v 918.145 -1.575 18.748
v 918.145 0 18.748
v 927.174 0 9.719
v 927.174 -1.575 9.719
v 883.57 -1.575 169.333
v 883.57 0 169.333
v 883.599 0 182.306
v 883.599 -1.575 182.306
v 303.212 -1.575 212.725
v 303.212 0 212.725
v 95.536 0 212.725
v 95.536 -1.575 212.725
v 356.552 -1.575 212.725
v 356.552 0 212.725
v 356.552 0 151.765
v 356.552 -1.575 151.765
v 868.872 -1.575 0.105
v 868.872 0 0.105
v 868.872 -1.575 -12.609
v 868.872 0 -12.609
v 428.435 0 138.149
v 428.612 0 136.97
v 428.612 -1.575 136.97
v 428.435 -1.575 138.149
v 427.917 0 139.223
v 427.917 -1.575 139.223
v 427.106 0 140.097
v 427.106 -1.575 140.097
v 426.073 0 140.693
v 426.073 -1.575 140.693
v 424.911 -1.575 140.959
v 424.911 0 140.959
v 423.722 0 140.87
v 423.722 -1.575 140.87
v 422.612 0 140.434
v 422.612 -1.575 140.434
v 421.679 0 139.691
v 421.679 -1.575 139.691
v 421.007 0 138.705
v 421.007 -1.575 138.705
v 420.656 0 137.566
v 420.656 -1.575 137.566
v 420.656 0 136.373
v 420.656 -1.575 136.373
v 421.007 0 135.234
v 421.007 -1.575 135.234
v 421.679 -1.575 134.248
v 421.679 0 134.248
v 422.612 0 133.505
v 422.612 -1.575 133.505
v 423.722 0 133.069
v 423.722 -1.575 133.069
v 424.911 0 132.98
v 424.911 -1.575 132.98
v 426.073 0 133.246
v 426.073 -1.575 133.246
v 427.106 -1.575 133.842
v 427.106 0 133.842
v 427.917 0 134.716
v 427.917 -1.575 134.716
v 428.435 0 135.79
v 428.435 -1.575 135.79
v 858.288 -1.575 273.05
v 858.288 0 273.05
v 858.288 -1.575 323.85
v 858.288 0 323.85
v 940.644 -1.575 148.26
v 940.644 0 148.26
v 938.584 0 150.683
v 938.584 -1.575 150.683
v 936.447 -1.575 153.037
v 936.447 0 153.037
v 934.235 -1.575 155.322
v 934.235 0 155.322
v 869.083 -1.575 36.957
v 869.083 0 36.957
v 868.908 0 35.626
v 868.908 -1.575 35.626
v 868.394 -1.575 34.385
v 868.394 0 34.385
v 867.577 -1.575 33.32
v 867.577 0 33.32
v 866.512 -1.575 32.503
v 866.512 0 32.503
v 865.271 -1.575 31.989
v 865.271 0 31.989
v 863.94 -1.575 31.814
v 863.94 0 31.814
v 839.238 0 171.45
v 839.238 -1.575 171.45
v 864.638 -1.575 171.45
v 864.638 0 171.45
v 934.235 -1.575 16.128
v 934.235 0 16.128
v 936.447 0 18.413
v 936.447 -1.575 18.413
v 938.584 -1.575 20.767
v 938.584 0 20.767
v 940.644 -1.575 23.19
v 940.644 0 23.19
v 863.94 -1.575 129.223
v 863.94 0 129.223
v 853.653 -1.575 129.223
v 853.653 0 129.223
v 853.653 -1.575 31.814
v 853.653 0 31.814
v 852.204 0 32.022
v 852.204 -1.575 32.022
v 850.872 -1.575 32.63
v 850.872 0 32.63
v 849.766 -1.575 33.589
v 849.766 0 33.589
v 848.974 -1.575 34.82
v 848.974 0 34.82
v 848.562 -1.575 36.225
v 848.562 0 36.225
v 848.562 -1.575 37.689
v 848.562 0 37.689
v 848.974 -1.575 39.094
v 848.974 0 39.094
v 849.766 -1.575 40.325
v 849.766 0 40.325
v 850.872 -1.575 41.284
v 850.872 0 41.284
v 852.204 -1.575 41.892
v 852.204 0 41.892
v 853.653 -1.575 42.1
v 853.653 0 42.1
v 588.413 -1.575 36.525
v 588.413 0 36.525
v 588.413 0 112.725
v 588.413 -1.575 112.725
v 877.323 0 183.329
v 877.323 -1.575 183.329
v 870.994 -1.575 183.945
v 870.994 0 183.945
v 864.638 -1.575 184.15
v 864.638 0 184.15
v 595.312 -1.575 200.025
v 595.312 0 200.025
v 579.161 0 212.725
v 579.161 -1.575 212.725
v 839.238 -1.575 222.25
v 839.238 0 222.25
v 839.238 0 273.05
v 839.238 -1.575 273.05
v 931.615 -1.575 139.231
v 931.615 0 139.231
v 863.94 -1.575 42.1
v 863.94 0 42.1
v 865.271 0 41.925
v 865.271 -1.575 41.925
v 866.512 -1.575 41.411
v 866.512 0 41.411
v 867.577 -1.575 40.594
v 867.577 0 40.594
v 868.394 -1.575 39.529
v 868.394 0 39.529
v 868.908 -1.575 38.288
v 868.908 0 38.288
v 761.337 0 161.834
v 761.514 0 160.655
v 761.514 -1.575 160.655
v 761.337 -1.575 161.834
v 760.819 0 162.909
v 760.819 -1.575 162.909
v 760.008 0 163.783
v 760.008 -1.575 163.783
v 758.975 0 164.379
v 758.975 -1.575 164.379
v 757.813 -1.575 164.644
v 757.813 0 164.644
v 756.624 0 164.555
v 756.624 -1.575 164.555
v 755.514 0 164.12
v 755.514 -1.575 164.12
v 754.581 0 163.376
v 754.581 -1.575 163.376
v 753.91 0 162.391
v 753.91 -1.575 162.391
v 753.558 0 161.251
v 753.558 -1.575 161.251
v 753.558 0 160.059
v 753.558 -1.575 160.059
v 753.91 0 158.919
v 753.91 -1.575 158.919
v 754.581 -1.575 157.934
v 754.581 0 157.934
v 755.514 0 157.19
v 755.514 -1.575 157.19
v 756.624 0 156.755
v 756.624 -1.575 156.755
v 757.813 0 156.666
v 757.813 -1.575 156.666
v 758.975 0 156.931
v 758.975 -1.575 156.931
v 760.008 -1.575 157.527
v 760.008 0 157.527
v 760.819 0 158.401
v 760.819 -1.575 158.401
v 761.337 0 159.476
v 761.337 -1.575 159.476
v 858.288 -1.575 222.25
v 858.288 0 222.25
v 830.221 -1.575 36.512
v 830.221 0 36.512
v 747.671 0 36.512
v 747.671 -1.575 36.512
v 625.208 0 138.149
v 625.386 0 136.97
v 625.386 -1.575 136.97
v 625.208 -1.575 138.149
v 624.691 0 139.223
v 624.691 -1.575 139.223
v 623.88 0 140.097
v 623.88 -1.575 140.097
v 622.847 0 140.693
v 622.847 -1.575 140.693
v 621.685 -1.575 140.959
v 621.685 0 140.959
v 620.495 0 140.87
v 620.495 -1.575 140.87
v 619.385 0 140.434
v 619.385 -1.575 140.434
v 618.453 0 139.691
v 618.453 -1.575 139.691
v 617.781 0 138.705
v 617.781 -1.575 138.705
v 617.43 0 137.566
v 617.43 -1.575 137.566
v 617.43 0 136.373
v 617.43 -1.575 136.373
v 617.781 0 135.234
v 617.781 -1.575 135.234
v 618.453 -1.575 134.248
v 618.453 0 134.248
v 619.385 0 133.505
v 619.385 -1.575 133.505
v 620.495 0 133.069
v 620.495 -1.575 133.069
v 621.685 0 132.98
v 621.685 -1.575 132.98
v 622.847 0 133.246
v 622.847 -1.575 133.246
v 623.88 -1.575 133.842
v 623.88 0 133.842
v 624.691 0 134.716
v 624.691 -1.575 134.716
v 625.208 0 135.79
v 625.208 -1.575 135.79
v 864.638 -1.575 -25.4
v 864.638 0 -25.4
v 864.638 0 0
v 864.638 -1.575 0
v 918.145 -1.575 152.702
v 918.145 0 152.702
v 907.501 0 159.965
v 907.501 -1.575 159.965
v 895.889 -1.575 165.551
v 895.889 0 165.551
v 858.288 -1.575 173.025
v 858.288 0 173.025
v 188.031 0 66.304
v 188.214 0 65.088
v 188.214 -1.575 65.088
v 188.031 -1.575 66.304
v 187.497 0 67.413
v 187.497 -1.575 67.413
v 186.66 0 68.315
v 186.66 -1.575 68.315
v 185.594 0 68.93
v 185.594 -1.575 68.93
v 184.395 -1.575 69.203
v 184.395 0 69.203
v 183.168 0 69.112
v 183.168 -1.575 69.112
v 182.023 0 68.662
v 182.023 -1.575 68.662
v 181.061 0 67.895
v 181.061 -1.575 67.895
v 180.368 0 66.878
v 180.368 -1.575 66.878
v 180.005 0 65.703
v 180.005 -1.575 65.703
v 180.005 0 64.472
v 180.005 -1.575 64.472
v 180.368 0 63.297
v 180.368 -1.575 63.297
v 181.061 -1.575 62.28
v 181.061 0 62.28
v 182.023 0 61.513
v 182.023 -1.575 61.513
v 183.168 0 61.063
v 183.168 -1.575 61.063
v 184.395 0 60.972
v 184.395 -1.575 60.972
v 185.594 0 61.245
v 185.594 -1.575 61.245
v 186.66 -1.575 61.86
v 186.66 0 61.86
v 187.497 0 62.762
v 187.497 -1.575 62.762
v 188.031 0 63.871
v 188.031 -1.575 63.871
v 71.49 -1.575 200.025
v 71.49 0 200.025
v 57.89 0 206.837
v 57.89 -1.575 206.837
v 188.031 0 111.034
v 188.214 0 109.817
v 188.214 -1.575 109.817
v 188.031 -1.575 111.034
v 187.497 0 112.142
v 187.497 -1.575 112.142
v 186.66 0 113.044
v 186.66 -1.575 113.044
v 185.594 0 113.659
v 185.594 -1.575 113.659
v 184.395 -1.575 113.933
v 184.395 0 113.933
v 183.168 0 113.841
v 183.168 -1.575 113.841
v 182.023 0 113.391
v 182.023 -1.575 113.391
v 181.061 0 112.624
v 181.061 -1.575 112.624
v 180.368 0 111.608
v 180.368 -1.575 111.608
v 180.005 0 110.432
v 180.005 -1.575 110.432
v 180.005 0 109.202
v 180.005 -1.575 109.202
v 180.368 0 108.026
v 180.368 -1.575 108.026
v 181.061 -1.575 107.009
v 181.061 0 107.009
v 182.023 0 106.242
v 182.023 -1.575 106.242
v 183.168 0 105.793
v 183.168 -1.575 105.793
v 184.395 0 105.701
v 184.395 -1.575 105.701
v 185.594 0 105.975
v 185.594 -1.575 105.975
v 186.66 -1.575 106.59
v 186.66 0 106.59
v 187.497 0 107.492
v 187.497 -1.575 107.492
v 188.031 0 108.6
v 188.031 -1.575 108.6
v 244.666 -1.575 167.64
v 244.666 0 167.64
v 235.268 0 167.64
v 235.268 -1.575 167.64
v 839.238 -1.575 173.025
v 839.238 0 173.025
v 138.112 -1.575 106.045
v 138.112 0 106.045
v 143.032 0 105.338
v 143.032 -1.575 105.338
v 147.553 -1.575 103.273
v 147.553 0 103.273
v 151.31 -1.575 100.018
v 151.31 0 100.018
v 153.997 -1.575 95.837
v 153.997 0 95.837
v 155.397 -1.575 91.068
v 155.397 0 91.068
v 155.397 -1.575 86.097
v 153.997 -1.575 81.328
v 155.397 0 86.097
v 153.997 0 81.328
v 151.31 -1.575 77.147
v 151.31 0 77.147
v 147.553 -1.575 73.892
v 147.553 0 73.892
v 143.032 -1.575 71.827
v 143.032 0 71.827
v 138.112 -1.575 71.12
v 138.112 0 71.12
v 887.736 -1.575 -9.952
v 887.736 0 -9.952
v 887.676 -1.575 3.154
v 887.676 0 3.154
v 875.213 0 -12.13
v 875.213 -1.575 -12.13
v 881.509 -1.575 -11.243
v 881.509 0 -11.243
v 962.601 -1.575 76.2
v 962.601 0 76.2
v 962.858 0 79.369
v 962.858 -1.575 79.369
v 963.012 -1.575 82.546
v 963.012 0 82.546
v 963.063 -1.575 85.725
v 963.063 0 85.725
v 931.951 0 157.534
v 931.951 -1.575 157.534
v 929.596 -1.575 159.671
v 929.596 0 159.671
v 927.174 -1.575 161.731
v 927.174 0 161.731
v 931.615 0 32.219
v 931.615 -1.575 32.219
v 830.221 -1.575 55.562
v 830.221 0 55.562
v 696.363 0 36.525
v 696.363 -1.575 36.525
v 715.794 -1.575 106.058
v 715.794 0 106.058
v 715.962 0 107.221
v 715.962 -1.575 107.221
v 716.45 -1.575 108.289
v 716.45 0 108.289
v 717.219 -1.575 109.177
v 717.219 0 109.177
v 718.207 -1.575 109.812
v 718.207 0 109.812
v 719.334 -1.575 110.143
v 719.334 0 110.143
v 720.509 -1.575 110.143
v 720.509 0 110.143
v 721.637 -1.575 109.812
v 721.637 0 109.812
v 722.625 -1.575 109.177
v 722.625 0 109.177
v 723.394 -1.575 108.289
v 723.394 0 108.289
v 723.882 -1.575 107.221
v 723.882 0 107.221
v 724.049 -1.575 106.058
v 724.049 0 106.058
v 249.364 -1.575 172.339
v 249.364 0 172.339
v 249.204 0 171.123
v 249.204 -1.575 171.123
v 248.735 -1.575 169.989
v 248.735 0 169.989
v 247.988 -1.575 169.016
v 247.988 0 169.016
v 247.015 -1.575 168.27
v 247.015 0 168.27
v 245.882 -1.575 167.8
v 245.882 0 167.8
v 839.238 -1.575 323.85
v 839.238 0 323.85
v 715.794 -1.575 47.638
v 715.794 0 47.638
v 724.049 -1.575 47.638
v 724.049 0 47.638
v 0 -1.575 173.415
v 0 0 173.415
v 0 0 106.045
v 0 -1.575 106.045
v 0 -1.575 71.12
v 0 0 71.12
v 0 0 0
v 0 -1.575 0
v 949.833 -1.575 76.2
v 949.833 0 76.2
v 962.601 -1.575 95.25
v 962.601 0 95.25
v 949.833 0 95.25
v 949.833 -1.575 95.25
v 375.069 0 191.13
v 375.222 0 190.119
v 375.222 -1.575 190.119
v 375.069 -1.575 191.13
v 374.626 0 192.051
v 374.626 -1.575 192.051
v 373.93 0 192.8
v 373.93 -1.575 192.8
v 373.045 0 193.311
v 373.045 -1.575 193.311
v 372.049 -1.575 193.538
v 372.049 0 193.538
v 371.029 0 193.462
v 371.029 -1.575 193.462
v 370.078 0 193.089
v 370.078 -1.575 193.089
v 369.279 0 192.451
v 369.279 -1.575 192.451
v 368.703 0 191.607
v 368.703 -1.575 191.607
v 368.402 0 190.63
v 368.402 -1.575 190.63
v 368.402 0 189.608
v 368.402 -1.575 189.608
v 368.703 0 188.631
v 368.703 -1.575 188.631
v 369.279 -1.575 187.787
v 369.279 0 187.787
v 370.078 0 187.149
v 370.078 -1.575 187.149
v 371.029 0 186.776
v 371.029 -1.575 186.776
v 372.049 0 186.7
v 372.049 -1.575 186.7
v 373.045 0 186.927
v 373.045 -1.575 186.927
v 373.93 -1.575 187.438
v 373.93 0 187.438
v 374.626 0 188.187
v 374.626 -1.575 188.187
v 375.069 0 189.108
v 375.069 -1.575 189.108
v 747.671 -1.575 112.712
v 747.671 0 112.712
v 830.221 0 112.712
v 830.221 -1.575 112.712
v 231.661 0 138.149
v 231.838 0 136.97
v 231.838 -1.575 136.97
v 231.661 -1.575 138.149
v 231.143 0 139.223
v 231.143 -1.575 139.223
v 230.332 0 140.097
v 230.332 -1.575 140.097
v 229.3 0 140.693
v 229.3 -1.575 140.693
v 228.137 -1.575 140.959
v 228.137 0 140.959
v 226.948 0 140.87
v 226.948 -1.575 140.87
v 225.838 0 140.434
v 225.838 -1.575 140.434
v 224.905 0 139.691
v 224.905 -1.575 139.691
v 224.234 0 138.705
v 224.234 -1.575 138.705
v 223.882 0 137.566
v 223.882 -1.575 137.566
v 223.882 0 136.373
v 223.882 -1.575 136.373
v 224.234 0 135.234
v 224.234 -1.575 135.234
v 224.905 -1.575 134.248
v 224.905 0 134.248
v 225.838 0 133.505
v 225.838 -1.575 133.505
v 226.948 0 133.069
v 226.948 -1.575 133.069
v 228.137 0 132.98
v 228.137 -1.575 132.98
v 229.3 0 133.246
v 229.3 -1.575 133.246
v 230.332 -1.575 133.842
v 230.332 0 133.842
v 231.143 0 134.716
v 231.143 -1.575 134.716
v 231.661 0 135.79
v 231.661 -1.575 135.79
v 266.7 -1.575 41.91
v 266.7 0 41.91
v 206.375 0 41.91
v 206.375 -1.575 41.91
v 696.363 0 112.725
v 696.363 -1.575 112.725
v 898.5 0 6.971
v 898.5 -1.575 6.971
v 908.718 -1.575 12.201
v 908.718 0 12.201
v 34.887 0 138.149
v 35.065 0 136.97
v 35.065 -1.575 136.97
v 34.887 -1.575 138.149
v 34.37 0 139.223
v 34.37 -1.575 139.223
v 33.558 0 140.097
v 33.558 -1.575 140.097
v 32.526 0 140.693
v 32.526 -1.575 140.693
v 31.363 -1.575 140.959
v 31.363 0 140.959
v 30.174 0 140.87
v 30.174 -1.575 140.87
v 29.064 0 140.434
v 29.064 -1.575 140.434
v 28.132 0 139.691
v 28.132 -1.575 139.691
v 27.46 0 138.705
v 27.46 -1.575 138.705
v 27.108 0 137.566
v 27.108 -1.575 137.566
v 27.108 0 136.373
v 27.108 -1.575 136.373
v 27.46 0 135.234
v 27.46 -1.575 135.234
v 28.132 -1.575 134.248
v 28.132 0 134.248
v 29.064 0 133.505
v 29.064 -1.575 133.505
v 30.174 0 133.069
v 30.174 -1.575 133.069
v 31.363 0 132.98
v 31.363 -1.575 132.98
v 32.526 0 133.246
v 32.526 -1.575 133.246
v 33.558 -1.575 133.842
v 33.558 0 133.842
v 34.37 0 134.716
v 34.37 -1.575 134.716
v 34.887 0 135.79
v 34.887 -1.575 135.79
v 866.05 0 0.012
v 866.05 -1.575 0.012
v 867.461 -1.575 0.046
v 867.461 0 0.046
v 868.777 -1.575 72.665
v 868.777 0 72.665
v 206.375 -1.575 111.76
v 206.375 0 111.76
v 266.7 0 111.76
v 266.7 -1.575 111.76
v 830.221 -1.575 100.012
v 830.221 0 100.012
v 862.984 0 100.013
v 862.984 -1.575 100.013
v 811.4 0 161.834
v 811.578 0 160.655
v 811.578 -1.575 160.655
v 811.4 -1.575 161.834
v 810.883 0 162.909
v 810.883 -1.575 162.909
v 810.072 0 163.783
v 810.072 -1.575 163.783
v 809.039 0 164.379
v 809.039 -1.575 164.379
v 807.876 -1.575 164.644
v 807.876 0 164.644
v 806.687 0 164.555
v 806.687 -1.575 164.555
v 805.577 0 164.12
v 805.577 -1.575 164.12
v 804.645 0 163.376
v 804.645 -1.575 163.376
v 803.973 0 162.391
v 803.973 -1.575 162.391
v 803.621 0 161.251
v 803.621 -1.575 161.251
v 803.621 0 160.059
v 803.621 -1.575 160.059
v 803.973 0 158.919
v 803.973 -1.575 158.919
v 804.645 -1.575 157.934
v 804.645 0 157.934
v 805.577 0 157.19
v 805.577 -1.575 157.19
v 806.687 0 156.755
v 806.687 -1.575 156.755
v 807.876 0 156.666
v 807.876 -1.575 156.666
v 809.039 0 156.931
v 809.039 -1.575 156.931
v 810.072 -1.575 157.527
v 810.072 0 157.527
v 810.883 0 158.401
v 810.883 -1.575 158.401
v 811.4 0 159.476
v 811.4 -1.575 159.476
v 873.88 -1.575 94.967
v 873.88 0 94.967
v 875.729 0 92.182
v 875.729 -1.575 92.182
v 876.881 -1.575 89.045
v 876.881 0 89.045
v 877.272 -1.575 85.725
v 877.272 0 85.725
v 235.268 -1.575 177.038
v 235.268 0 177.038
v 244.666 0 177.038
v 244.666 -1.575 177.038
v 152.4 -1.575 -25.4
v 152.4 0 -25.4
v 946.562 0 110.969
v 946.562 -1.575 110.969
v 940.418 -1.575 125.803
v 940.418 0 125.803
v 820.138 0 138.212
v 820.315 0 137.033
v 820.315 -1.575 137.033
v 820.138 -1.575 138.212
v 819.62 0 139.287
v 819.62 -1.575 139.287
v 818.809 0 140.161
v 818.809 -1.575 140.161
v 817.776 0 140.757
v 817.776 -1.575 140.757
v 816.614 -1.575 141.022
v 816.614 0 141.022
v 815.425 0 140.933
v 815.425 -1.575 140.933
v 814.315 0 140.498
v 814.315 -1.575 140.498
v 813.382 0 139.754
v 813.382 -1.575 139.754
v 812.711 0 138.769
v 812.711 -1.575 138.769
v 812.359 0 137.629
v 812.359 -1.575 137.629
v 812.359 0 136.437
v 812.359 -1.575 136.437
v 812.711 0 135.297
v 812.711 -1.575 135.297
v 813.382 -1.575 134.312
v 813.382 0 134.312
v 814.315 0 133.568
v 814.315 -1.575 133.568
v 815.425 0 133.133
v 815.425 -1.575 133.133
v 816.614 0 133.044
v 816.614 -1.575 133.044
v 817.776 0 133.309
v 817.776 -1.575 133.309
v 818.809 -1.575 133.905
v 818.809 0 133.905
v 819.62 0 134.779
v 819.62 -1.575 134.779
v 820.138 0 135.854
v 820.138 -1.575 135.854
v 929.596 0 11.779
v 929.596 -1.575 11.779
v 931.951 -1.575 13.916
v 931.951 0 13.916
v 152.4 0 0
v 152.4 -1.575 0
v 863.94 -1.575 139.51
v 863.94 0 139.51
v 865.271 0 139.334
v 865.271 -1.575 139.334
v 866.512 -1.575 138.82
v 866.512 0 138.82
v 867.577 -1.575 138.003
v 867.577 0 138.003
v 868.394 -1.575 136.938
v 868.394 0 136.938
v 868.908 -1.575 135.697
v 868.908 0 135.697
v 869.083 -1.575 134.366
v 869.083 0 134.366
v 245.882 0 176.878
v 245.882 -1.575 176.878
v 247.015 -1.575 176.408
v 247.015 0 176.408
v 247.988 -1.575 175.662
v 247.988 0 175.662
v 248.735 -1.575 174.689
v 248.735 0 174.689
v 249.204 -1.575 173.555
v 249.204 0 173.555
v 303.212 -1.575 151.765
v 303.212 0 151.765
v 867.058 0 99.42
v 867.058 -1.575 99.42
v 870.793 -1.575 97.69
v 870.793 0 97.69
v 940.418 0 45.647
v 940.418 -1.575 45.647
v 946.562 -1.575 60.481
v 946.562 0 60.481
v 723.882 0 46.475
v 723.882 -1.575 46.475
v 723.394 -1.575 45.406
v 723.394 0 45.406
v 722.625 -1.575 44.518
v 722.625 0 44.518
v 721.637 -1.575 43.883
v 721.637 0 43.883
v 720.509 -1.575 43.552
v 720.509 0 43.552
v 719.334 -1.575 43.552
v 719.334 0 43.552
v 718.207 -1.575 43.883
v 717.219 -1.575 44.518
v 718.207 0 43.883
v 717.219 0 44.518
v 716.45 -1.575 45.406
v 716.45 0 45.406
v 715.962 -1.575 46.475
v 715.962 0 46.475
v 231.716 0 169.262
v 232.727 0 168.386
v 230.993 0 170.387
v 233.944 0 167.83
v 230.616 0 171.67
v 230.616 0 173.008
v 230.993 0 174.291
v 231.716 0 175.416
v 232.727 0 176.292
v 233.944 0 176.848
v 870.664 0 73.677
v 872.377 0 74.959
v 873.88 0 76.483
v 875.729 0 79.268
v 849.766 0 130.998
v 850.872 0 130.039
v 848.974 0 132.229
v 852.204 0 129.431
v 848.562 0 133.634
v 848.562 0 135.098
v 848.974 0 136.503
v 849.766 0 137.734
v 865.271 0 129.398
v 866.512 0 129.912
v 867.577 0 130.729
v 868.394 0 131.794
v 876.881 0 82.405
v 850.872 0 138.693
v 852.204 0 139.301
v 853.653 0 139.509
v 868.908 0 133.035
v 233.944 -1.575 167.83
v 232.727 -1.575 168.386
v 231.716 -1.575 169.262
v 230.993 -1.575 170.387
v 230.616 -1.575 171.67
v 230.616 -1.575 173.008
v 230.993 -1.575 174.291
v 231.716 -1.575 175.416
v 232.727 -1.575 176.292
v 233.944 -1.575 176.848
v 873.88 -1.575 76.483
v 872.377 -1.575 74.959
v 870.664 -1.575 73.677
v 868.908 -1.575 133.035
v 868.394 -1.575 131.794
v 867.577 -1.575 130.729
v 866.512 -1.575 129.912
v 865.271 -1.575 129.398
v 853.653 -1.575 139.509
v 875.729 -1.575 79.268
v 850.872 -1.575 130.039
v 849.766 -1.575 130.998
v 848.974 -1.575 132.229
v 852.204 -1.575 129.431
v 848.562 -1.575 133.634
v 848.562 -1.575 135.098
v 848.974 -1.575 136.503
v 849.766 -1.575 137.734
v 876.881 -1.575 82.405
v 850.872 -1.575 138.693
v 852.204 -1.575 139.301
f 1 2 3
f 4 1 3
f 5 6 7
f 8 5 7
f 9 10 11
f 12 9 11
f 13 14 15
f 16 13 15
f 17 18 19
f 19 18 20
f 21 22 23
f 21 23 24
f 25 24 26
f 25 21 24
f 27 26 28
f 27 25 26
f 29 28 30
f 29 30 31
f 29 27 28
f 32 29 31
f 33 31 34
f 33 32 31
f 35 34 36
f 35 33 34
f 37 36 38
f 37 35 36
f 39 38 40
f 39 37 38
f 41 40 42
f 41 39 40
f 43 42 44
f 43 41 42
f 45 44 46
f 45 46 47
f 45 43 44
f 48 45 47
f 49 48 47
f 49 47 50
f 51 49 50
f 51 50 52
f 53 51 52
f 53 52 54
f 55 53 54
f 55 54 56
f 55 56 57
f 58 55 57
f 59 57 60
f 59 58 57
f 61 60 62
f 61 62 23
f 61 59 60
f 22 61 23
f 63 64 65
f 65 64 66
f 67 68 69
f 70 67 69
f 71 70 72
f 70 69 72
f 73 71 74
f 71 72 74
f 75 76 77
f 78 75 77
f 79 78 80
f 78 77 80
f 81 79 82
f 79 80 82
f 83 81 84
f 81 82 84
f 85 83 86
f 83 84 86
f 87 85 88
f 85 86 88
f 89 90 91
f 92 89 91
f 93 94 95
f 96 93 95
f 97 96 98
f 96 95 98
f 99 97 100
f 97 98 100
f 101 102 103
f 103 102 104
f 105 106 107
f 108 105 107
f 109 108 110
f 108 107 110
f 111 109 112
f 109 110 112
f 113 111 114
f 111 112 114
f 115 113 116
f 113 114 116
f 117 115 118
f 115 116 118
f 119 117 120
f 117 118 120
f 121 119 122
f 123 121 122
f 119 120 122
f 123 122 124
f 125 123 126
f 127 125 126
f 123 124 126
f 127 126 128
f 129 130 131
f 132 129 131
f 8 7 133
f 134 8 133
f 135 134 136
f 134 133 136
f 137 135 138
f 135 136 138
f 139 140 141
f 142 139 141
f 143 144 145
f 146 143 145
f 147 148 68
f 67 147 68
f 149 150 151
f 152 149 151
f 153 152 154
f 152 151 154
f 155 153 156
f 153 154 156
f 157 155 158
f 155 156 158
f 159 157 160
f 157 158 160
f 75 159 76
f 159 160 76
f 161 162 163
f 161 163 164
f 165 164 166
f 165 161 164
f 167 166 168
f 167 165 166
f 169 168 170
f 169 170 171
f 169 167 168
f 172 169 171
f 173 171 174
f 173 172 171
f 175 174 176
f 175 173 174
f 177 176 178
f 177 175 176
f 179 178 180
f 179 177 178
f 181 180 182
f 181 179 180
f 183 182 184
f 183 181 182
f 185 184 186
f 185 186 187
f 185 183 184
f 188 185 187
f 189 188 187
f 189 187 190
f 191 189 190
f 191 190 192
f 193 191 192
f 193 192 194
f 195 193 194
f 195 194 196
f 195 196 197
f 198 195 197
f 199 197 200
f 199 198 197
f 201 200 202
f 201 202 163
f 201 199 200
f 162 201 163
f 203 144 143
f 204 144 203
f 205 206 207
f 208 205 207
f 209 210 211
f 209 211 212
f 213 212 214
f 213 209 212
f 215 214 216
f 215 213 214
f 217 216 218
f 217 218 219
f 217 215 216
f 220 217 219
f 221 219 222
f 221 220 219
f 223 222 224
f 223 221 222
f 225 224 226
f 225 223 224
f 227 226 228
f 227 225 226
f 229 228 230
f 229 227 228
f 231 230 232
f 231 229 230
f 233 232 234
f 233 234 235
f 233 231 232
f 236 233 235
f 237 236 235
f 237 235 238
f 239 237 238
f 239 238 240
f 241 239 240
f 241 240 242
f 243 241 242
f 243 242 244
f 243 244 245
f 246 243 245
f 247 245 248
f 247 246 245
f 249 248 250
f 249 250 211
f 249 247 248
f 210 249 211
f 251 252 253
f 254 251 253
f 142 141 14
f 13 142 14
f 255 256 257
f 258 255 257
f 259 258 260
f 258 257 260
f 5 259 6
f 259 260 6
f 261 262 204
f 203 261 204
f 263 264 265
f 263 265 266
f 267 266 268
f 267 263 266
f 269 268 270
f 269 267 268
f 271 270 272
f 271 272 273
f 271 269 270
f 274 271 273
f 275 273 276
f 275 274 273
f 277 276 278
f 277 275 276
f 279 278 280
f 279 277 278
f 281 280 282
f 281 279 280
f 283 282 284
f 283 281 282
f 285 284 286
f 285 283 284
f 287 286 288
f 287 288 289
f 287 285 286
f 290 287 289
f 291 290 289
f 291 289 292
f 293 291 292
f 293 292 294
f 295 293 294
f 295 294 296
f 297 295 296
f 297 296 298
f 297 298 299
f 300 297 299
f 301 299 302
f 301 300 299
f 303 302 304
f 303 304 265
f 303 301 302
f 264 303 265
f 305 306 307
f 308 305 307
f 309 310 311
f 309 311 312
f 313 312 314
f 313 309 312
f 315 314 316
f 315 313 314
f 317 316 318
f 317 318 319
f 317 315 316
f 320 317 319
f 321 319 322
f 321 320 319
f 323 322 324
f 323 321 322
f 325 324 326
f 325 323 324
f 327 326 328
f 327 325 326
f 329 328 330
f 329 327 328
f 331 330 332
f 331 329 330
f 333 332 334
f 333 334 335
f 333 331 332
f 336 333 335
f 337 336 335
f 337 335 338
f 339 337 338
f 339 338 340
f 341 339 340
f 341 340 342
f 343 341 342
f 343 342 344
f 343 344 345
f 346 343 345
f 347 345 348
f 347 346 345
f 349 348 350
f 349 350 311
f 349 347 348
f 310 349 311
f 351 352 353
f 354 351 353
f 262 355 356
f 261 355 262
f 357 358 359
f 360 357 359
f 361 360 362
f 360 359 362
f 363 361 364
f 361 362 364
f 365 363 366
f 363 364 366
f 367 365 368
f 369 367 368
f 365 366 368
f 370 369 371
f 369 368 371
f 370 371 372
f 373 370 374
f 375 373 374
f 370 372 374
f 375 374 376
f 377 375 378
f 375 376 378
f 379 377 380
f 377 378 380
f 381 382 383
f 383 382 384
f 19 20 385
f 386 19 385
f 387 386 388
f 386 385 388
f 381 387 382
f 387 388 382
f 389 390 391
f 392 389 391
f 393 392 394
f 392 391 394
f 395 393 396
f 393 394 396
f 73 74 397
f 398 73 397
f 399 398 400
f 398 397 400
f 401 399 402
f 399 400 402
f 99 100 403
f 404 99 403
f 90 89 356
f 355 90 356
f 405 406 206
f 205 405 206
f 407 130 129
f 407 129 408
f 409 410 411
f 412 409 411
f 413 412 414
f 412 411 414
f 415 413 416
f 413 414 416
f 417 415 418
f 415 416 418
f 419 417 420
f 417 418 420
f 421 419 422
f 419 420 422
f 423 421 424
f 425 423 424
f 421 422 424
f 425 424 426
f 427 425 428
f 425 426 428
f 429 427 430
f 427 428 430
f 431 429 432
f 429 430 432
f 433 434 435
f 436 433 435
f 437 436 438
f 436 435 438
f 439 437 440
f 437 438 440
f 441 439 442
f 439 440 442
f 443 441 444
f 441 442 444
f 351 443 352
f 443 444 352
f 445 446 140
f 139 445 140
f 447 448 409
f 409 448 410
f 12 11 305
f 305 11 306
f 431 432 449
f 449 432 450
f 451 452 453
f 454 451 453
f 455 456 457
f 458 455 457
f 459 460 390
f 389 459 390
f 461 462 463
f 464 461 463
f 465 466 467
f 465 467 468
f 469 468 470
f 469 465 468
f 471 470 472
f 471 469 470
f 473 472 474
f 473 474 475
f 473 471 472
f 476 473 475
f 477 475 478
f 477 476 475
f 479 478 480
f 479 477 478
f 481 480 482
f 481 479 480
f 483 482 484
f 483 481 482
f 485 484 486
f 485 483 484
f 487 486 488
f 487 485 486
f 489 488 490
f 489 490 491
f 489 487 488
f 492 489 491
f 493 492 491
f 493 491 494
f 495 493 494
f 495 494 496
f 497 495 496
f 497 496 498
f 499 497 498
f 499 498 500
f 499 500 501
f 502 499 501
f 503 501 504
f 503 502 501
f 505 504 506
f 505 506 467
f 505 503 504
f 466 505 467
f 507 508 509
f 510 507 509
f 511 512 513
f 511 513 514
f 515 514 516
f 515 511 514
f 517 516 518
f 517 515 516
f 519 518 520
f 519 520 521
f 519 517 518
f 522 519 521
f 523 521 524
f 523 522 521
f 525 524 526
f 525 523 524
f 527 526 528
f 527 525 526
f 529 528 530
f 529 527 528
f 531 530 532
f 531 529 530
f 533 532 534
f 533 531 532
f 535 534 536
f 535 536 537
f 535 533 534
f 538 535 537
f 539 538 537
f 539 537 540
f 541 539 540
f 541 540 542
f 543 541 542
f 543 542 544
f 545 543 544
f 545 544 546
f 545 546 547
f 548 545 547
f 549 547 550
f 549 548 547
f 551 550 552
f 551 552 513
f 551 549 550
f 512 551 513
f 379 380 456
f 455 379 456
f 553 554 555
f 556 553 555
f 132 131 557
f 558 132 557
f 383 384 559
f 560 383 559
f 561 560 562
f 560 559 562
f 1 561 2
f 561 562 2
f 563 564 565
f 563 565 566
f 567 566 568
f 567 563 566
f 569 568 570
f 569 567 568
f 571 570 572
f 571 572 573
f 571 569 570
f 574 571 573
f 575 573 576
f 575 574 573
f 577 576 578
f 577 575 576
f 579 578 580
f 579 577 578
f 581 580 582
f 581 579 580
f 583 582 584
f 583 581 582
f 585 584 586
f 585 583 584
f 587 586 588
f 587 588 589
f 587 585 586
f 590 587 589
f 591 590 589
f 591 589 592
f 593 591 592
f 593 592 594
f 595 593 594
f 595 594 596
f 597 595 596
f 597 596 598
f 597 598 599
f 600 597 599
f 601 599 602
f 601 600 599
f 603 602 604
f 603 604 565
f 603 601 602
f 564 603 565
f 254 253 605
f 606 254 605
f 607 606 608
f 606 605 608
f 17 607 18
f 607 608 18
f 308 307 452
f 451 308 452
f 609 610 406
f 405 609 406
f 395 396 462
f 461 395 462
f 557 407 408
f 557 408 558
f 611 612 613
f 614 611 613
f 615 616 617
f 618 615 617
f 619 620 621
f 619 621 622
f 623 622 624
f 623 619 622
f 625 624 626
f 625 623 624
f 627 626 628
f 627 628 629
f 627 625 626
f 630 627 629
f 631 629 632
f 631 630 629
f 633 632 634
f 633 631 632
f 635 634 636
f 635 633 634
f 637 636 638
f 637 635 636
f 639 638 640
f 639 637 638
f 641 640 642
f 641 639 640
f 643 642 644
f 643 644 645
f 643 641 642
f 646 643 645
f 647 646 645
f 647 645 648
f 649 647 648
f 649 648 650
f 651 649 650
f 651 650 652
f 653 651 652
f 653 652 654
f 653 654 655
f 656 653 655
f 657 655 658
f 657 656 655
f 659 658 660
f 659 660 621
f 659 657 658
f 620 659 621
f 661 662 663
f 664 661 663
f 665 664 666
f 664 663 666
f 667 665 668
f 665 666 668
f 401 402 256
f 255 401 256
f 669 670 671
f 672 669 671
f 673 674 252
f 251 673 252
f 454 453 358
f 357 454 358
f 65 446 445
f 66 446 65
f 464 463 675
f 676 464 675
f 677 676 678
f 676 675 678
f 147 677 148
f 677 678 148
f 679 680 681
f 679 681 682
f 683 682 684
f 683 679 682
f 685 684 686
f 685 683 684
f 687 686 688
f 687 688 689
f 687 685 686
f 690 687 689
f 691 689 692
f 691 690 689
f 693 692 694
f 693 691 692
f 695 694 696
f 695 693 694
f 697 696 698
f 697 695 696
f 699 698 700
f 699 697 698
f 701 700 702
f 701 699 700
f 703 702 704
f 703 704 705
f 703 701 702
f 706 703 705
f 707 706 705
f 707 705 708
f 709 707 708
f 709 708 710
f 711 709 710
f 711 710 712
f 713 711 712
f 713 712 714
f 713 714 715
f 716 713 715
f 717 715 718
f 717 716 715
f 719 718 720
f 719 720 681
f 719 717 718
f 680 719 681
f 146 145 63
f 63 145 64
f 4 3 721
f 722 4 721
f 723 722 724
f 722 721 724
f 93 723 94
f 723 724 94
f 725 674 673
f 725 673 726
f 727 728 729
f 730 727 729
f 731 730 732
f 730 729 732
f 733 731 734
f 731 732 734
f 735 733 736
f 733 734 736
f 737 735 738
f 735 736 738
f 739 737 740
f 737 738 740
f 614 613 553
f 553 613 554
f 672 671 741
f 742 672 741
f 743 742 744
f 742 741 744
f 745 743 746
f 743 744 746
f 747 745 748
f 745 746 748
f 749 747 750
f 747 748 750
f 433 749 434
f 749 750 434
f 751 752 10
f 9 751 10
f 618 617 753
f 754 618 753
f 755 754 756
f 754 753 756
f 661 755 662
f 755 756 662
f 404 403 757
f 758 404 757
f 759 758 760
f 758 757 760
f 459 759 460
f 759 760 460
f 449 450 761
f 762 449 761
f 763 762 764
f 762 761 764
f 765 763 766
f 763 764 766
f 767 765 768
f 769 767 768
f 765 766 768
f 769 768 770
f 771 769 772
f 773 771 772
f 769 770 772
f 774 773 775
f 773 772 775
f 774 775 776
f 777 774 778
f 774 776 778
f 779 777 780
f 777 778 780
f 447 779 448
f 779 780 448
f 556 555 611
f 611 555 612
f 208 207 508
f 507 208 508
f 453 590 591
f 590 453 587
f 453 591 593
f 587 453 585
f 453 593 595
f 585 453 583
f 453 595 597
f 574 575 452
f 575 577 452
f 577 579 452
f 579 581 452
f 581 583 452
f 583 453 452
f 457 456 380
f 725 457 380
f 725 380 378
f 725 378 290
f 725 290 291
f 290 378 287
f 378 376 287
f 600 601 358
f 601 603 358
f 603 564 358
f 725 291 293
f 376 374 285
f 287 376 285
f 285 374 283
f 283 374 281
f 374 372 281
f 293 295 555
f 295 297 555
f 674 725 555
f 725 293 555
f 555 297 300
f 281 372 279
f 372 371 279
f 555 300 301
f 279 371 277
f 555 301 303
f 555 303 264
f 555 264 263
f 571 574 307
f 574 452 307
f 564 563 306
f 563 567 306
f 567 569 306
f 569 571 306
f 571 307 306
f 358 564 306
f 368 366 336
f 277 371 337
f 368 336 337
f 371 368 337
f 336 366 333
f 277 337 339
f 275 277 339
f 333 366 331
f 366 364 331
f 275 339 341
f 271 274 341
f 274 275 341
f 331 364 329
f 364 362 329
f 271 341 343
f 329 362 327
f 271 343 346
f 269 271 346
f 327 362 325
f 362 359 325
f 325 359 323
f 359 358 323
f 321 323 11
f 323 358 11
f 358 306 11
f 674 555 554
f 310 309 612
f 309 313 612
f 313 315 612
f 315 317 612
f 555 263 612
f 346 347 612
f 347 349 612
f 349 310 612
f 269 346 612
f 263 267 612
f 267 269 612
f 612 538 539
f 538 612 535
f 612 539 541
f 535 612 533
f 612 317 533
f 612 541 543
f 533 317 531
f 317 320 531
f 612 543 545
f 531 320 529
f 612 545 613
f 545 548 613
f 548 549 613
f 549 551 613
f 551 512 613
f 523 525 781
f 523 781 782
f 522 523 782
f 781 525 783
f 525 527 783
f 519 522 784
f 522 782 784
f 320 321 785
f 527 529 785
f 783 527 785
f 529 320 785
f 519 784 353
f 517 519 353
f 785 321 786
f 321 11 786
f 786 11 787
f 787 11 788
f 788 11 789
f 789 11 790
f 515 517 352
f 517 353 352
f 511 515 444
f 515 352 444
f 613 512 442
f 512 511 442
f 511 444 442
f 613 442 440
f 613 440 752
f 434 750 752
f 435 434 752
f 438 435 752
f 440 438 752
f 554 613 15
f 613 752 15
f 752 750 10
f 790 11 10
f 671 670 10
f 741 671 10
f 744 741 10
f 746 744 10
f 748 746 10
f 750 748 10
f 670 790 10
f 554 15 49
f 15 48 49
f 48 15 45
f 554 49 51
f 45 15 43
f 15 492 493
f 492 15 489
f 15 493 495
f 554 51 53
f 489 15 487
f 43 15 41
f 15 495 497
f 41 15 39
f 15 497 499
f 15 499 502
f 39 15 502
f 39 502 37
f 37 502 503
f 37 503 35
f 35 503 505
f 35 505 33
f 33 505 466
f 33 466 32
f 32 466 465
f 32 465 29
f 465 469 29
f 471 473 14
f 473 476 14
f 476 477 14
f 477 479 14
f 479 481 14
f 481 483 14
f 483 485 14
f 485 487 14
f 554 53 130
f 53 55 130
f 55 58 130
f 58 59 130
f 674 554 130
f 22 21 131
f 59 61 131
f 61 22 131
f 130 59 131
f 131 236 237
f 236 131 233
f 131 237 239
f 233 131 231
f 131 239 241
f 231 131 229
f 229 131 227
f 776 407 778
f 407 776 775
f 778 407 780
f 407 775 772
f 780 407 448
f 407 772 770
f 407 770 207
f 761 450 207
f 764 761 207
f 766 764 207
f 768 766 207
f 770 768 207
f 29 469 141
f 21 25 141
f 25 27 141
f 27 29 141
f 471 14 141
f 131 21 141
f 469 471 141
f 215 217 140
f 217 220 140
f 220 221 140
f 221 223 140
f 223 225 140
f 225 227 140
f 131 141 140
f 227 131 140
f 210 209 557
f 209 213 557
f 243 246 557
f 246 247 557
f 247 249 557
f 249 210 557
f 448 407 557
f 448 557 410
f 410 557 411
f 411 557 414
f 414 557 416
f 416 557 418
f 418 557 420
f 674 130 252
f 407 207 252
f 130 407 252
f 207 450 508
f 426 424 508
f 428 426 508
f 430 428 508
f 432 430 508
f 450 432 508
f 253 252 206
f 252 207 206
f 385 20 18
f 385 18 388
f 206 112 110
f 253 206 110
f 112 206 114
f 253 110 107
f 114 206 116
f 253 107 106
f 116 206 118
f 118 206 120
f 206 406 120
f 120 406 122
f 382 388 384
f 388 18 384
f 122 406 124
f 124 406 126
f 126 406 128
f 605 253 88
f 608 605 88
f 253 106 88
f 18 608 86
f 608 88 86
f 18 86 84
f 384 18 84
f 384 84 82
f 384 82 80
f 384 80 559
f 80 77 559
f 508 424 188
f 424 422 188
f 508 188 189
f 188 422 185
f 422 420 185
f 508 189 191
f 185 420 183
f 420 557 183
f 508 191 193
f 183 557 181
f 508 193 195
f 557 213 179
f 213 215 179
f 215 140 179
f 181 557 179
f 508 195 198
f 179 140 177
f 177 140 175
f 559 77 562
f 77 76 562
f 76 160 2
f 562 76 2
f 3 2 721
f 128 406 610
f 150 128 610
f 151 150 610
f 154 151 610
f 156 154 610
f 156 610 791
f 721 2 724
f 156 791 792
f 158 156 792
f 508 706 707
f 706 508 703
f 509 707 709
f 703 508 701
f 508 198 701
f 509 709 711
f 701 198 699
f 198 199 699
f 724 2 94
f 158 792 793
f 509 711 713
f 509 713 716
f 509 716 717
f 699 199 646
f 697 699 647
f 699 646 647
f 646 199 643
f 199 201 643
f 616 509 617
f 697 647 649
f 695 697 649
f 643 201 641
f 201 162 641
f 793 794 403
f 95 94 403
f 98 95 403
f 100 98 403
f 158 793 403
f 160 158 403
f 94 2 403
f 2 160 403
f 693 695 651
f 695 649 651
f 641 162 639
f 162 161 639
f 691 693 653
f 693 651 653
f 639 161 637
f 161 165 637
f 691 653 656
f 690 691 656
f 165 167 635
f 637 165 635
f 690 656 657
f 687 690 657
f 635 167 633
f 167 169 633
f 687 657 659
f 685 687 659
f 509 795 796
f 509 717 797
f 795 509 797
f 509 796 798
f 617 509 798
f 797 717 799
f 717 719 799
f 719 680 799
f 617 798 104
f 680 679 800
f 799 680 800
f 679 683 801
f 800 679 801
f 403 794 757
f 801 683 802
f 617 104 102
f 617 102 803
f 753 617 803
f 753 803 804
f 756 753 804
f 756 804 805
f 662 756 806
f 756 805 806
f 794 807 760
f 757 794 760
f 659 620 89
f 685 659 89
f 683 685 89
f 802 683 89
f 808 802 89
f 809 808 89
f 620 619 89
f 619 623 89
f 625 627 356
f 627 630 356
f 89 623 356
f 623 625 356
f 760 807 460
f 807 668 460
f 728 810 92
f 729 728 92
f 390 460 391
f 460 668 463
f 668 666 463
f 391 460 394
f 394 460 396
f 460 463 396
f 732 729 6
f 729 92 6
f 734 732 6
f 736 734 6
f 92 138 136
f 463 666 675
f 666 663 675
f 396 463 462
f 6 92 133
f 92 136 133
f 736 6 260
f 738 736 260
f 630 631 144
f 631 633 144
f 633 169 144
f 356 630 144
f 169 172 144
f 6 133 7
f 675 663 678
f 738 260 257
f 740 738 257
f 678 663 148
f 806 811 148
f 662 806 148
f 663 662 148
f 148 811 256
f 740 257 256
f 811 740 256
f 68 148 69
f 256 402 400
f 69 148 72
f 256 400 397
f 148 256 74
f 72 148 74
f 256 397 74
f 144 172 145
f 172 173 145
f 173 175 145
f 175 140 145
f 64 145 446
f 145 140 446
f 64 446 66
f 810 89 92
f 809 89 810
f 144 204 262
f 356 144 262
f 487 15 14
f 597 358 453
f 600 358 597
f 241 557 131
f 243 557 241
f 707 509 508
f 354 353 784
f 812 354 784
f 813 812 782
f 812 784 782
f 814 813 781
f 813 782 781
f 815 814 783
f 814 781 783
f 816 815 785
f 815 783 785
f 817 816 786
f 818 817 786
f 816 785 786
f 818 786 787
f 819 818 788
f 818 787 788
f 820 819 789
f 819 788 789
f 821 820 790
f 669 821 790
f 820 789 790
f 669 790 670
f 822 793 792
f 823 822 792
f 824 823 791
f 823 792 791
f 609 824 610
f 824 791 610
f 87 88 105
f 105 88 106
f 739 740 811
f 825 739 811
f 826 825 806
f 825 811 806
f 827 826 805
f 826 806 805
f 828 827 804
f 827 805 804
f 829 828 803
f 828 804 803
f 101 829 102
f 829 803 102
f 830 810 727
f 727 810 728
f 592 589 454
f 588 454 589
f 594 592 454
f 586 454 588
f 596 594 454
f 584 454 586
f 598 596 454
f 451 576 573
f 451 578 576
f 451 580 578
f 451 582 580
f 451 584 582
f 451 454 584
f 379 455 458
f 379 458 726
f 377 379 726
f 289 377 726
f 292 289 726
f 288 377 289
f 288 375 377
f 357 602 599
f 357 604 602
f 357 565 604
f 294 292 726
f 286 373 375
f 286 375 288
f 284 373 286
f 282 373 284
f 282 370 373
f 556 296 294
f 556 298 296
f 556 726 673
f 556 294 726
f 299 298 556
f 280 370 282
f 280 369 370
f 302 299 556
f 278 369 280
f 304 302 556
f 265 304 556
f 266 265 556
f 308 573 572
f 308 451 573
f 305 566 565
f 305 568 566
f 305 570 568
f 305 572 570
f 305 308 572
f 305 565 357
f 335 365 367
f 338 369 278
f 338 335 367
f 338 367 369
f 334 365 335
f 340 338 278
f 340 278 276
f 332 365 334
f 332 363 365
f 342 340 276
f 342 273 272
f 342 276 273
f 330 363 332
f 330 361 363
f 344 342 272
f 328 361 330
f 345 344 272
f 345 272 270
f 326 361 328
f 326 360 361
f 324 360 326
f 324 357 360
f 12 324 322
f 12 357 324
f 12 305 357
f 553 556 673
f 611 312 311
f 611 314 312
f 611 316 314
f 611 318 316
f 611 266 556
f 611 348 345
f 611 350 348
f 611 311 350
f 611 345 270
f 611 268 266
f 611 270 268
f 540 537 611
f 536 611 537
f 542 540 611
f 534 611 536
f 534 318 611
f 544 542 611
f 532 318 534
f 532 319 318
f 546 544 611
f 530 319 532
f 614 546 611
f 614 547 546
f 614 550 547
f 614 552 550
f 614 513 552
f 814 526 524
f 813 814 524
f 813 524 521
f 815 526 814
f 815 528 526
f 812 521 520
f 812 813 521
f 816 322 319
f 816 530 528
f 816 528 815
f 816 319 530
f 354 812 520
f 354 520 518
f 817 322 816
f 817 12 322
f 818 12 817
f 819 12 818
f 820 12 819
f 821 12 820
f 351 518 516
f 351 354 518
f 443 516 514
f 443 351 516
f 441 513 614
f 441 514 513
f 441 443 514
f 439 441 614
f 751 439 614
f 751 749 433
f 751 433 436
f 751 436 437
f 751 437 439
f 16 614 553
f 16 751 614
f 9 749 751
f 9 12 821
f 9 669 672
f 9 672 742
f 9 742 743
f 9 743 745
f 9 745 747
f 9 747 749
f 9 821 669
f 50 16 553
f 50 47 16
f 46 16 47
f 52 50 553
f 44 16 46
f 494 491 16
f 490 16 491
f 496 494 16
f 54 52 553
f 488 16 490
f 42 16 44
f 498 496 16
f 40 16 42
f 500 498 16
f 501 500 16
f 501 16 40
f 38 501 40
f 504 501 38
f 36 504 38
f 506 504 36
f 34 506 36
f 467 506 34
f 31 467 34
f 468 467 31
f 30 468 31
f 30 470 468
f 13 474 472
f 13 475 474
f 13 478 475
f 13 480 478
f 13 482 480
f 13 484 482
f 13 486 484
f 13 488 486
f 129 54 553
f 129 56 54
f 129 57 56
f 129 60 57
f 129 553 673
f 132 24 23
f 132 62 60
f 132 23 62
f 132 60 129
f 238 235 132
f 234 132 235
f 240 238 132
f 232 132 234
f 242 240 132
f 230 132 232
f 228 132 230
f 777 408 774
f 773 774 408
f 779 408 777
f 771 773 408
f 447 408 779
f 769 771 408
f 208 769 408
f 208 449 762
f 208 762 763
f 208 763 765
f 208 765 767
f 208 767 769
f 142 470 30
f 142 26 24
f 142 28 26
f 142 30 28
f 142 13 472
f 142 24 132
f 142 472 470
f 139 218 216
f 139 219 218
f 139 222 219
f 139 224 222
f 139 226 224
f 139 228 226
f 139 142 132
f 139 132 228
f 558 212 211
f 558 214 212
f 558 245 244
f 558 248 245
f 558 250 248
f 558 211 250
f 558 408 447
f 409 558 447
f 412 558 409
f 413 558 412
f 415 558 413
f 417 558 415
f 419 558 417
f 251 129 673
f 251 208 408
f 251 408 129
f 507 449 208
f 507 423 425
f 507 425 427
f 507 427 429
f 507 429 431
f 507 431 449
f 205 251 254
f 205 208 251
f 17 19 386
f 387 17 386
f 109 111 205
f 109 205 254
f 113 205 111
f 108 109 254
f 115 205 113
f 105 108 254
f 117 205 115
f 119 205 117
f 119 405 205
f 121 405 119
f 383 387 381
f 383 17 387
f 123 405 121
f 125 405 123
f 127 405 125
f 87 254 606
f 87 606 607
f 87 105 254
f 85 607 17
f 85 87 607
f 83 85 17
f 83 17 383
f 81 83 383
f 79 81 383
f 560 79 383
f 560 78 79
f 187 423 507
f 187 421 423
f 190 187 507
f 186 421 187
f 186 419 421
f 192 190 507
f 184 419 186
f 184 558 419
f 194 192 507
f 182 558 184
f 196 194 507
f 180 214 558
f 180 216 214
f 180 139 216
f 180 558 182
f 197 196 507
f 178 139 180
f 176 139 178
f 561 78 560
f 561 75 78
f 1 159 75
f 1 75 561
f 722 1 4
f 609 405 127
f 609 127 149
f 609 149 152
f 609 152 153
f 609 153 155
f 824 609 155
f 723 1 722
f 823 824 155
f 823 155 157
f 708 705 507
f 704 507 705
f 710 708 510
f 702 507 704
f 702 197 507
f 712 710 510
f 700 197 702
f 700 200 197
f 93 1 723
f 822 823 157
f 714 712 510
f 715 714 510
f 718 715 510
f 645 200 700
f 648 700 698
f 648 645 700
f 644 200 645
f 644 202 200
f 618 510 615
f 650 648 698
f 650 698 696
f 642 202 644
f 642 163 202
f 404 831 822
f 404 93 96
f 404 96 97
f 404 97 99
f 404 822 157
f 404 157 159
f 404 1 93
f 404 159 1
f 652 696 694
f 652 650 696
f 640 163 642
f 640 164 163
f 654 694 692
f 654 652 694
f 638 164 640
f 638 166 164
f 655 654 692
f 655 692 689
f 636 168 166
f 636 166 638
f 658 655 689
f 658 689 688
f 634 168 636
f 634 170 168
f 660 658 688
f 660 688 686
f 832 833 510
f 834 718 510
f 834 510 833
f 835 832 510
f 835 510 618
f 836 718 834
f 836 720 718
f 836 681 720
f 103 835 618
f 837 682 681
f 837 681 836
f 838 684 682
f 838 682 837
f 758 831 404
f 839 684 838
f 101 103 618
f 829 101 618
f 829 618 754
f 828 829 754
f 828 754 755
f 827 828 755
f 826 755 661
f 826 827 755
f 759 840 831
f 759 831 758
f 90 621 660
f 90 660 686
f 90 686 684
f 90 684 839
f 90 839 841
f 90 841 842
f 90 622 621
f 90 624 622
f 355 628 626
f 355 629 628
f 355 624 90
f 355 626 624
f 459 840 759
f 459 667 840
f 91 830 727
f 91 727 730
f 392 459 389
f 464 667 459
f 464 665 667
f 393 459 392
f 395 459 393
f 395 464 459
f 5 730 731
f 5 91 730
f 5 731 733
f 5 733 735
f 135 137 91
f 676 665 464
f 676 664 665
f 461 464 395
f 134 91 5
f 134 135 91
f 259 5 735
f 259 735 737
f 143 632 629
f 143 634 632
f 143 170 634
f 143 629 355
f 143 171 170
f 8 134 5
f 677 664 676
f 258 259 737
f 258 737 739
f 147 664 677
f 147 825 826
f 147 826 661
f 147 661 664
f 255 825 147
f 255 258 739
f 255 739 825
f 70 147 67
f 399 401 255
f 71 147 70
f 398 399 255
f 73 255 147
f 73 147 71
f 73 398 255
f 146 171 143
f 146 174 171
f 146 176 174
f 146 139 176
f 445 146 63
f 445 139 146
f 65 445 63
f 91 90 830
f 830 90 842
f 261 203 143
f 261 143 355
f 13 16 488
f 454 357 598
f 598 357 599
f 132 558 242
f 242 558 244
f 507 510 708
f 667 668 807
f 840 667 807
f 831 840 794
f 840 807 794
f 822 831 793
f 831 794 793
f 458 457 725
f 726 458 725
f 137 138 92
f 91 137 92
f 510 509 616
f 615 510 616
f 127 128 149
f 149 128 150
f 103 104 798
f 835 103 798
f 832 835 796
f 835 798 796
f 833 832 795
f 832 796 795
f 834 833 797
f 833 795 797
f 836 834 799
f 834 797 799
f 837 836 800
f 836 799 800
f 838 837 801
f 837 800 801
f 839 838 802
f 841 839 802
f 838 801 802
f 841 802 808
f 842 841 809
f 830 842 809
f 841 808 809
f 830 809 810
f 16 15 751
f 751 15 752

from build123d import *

# Parameters (mm, degrees)
F0_R     = 4.1275
F0_R_2   = 4.0005
F0_W     = 107.95
F0_H     = 76.2
F0_R_3   = 3.429
F0_W_2   = 712.238387
F0_H_2   = 25.4
F0_W_3   = 19.05
F0_H_3   = 50.8
F1_DEPTH = 1.5748
F2_W     = 19.05
F2_H     = 1.5748
F3_DEPTH = 25.4


with BuildPart() as f1:
    # F0 (on Front) → F1 (new body)
    with BuildSketch(Plane.XZ):
        with BuildLine():
            Line((0, 71.12), (0, 0))
            Line((0, 0), (152.4, 0))
            Line((152.4, 0), (864.638387, 0))
            ThreePointArc((864.638387, 0), (866.755792, 0.026154), (868.871905, 0.1046))
            ThreePointArc((868.871905, 0.1046), (878.359069, 1.105153), (887.676316, 3.15364))
            ThreePointArc((887.676316, 3.15364), (903.696678, 9.414938), (918.144584, 18.748418))
            ThreePointArc((918.144584, 18.748418), (921.788387, 21.829358), (925.255116, 25.108271))
            Line((925.255116, 25.108271), (873.880221, 76.483166))
            ThreePointArc((873.880221, 76.483166), (871.544457, 74.285755), (868.777424, 72.664665))
            Line((868.777424, 72.664665), (830.221387, 55.5625))
            Line((830.221387, 55.5625), (830.221387, 36.5125))
            Line((830.221387, 36.5125), (747.671387, 36.5125))
            Line((747.671387, 36.5125), (747.671387, 112.7125))
            Line((747.671387, 112.7125), (830.221387, 112.7125))
            Line((830.221387, 112.7125), (830.221387, 100.0125))
            Line((830.221387, 100.0125), (862.984297, 100.0125))
            ThreePointArc((862.984297, 100.0125), (868.988044, 98.689863), (873.880221, 94.966834))
            Line((873.880221, 94.966834), (925.255116, 146.341729))
            ThreePointArc((925.255116, 146.341729), (921.788387, 149.620642), (918.144584, 152.701582))
            ThreePointArc((918.144584, 152.701582), (901.799905, 162.976519), (883.570429, 169.333333))
            ThreePointArc((883.570429, 169.333333), (874.163387, 170.91919), (864.638387, 171.45))
            Line((864.638387, 171.45), (858.288387, 171.45))
            Line((858.288387, 171.45), (839.238387, 171.45))
            Line((839.238387, 171.45), (839.238387, 222.25))
            Line((839.238387, 222.25), (839.238387, 273.05))
            Line((839.238387, 273.05), (839.238387, 323.85))
            Line((839.238387, 323.85), (595.3125, 200.025))
            Line((595.3125, 200.025), (455.231453, 200.025))
            Line((455.231453, 200.025), (439.727616, 200.025))
            Line((439.727616, 200.025), (356.5525, 200.025))
            Line((356.5525, 200.025), (356.5525, 151.765))
            Line((356.5525, 151.765), (303.2125, 151.765))
            Line((303.2125, 151.765), (303.2125, 200.025))
            Line((303.2125, 200.025), (71.490397, 200.025))
            Line((71.490397, 200.025), (0, 158.75))
            Line((0, 158.75), (0, 106.045))
            Line((0, 106.045), (138.1125, 106.045))
            ThreePointArc((138.1125, 106.045), (155.575, 88.5825), (138.1125, 71.12))
            Line((138.1125, 71.12), (0, 71.12))
        make_face()
        with Locations((184.0865, 65.0875)):
            Circle(F0_R, mode=Mode.SUBTRACT)
        Polygon((206.375, 41.91), (206.375, 88.5825), (206.375, 111.76), (266.7, 111.76), (266.7, 41.91), align=None, mode=Mode.SUBTRACT)
        with Locations((31.0642, 136.9695)):
            Circle(F0_R_2, mode=Mode.SUBTRACT)
        with Locations((184.0865, 109.8169)):
            Circle(F0_R, mode=Mode.SUBTRACT)
        with Locations((227.838, 136.9695)):
            Circle(F0_R_2, mode=Mode.SUBTRACT)
        with Locations((424.6118, 136.9695)):
            Circle(F0_R_2, mode=Mode.SUBTRACT)
        with BuildLine():
            ThreePointArc((853.652887, 31.8135), (848.509387, 36.957), (853.652887, 42.1005))
            Line((853.652887, 42.1005), (863.939887, 42.1005))
            ThreePointArc((863.939887, 42.1005), (867.576891, 40.594004), (869.083387, 36.957))
            ThreePointArc((869.083387, 36.957), (867.576891, 33.319996), (863.939887, 31.8135))
            Line((863.939887, 31.8135), (853.652887, 31.8135))
        make_face(mode=Mode.SUBTRACT)
        with Locations((642.388387, 74.6252)):
            Rectangle(F0_W, F0_H, mode=Mode.SUBTRACT)
        with BuildLine():
            ThreePointArc((715.794387, 106.0577), (719.921887, 110.1852), (724.049387, 106.0577))
            Line((724.049387, 106.0577), (724.049387, 47.6377))
            ThreePointArc((724.049387, 47.6377), (719.921887, 43.5102), (715.794387, 47.6377))
            Line((715.794387, 47.6377), (715.794387, 106.0577))
        make_face(mode=Mode.SUBTRACT)
        with Locations((621.3856, 136.9695)):
            Circle(F0_R_2, mode=Mode.SUBTRACT)
        with Locations((816.314887, 137.033)):
            Circle(F0_R_2, mode=Mode.SUBTRACT)
        with BuildLine():
            ThreePointArc((853.652887, 129.2225), (848.509387, 134.366), (853.652887, 139.5095))
            Line((853.652887, 139.5095), (863.939887, 139.5095))
            ThreePointArc((863.939887, 139.5095), (867.576891, 138.003004), (869.083387, 134.366))
            ThreePointArc((869.083387, 134.366), (867.576891, 130.728996), (863.939887, 129.2225))
            Line((863.939887, 129.2225), (853.652887, 129.2225))
        make_face(mode=Mode.SUBTRACT)
        with BuildLine():
            ThreePointArc((244.6655, 177.038), (247.988195, 175.661695), (249.3645, 172.339))
            ThreePointArc((249.3645, 172.339), (247.988195, 169.016305), (244.6655, 167.64))
            Line((244.6655, 167.64), (235.2675, 167.64))
            ThreePointArc((235.2675, 167.64), (230.5685, 172.339), (235.2675, 177.038))
            Line((235.2675, 177.038), (244.6655, 177.038))
        make_face(mode=Mode.SUBTRACT)
        with Locations((371.7925, 190.119)):
            Circle(F0_R_3, mode=Mode.SUBTRACT)
        with Locations((757.513887, 160.655)):
            Circle(F0_R_2, mode=Mode.SUBTRACT)
        with Locations((807.577287, 160.655)):
            Circle(F0_R_2, mode=Mode.SUBTRACT)
        with BuildLine():
            ThreePointArc((873.880221, 94.966834), (876.39713, 90.647253), (877.271797, 85.725))
            Line((877.271797, 85.725), (950.363387, 85.725))
            ThreePointArc((950.363387, 85.725), (950.230582, 90.49489), (949.832577, 95.25))
            ThreePointArc((949.832577, 95.25), (943.83796, 118.530537), (931.614968, 139.231197))
            ThreePointArc((931.614968, 139.231197), (928.534029, 142.875), (925.255116, 146.341729))
            Line((925.255116, 146.341729), (873.880221, 94.966834))
        make_face()
        with BuildLine():
            Line((873.880221, 76.483166), (925.255116, 25.108271))
            ThreePointArc((925.255116, 25.108271), (928.534029, 28.575), (931.614968, 32.218803))
            ThreePointArc((931.614968, 32.218803), (943.83796, 52.919463), (949.832577, 76.2))
            ThreePointArc((949.832577, 76.2), (950.230582, 80.95511), (950.363387, 85.725))
            Line((950.363387, 85.725), (877.271797, 85.725))
            ThreePointArc((877.271797, 85.725), (876.39713, 80.802747), (873.880221, 76.483166))
        make_face()
        with BuildLine():
            ThreePointArc((950.363387, 85.725), (950.230582, 80.95511), (949.832577, 76.2))
            Line((949.832577, 76.2), (962.601416, 76.2))
            ThreePointArc((962.601416, 76.2), (962.947826, 80.956902), (963.063387, 85.725))
            Line((963.063387, 85.725), (950.363387, 85.725))
        make_face()
        with BuildLine():
            ThreePointArc((949.832577, 95.25), (950.230582, 90.49489), (950.363387, 85.725))
            Line((950.363387, 85.725), (963.063387, 85.725))
            Line((963.063387, 85.725), (962.601416, 95.25))
            Line((962.601416, 95.25), (949.832577, 95.25))
        make_face()
        with BuildLine():
            Line((934.235372, 155.321985), (925.255116, 146.341729))
            ThreePointArc((925.255116, 146.341729), (928.534029, 142.875), (931.614968, 139.231197))
            Line((931.614968, 139.231197), (940.643901, 148.26013))
            ThreePointArc((940.643901, 148.26013), (937.525213, 151.868717), (934.235372, 155.321985))
        make_face()
        with BuildLine():
            ThreePointArc((918.144584, 152.701582), (921.788387, 149.620642), (925.255116, 146.341729))
            Line((925.255116, 146.341729), (934.235372, 155.321985))
            ThreePointArc((934.235372, 155.321985), (930.782104, 158.611826), (927.173517, 161.730514))
            Line((927.173517, 161.730514), (918.144584, 152.701582))
        make_face()
        with BuildLine():
            ThreePointArc((864.638387, 171.45), (874.163387, 170.91919), (883.570429, 169.333333))
            Line((883.570429, 169.333333), (883.598973, 182.306452))
            ThreePointArc((883.598973, 182.306452), (874.163387, 183.688029), (864.638387, 184.15))
            Line((864.638387, 184.15), (864.638387, 171.45))
        make_face()
        with BuildLine():
            ThreePointArc((931.614968, 32.218803), (928.534029, 28.575), (925.255116, 25.108271))
            Line((925.255116, 25.108271), (934.235372, 16.128015))
            ThreePointArc((934.235372, 16.128015), (937.525213, 19.581283), (940.643901, 23.18987))
            Line((940.643901, 23.18987), (931.614968, 32.218803))
        make_face()
        with BuildLine():
            ThreePointArc((925.255116, 25.108271), (921.788387, 21.829358), (918.144584, 18.748418))
            Line((918.144584, 18.748418), (927.173517, 9.719486))
            ThreePointArc((927.173517, 9.719486), (930.782104, 12.838174), (934.235372, 16.128015))
            Line((934.235372, 16.128015), (925.255116, 25.108271))
        make_face()
        with BuildLine():
            ThreePointArc((887.676316, 3.15364), (878.359069, 1.105153), (868.871905, 0.1046))
            Line((868.871905, 0.1046), (868.871905, -12.60891))
            ThreePointArc((868.871905, -12.60891), (878.368219, -11.737671), (887.735648, -9.951524))
            Line((887.735648, -9.951524), (887.676316, 3.15364))
        make_face()
        with Locations((508.519193, -12.7)):
            Rectangle(F0_W_2, F0_H_2)
        with Locations((848.763387, 196.85)):
            Rectangle(F0_W_3, F0_H_3)
        with Locations((848.763387, 298.45)):
            Rectangle(F0_W_3, F0_H_3)
        Polygon((356.5525, 212.725), (356.5525, 200.025), (439.727616, 200.025), (455.231453, 200.025), (595.3125, 200.025), (579.161286, 212.725), align=None)
        Polygon((95.536456, 212.725), (71.490397, 200.025), (303.2125, 200.025), (303.2125, 212.725), align=None)
        Polygon((0, 173.414697), (0, 158.75), (71.490397, 200.025), (57.889698, 206.837329), align=None)
    extrude(amount=F1_DEPTH)

    # F2 (on face) → F3 (cut)
    with BuildSketch(Plane.XZ.offset(1.5748)):
        with Locations((848.763387, 172.2374)):
            Rectangle(F2_W, F2_H)
    extrude(amount=-F3_DEPTH, mode=Mode.SUBTRACT)


solid = f1.part
